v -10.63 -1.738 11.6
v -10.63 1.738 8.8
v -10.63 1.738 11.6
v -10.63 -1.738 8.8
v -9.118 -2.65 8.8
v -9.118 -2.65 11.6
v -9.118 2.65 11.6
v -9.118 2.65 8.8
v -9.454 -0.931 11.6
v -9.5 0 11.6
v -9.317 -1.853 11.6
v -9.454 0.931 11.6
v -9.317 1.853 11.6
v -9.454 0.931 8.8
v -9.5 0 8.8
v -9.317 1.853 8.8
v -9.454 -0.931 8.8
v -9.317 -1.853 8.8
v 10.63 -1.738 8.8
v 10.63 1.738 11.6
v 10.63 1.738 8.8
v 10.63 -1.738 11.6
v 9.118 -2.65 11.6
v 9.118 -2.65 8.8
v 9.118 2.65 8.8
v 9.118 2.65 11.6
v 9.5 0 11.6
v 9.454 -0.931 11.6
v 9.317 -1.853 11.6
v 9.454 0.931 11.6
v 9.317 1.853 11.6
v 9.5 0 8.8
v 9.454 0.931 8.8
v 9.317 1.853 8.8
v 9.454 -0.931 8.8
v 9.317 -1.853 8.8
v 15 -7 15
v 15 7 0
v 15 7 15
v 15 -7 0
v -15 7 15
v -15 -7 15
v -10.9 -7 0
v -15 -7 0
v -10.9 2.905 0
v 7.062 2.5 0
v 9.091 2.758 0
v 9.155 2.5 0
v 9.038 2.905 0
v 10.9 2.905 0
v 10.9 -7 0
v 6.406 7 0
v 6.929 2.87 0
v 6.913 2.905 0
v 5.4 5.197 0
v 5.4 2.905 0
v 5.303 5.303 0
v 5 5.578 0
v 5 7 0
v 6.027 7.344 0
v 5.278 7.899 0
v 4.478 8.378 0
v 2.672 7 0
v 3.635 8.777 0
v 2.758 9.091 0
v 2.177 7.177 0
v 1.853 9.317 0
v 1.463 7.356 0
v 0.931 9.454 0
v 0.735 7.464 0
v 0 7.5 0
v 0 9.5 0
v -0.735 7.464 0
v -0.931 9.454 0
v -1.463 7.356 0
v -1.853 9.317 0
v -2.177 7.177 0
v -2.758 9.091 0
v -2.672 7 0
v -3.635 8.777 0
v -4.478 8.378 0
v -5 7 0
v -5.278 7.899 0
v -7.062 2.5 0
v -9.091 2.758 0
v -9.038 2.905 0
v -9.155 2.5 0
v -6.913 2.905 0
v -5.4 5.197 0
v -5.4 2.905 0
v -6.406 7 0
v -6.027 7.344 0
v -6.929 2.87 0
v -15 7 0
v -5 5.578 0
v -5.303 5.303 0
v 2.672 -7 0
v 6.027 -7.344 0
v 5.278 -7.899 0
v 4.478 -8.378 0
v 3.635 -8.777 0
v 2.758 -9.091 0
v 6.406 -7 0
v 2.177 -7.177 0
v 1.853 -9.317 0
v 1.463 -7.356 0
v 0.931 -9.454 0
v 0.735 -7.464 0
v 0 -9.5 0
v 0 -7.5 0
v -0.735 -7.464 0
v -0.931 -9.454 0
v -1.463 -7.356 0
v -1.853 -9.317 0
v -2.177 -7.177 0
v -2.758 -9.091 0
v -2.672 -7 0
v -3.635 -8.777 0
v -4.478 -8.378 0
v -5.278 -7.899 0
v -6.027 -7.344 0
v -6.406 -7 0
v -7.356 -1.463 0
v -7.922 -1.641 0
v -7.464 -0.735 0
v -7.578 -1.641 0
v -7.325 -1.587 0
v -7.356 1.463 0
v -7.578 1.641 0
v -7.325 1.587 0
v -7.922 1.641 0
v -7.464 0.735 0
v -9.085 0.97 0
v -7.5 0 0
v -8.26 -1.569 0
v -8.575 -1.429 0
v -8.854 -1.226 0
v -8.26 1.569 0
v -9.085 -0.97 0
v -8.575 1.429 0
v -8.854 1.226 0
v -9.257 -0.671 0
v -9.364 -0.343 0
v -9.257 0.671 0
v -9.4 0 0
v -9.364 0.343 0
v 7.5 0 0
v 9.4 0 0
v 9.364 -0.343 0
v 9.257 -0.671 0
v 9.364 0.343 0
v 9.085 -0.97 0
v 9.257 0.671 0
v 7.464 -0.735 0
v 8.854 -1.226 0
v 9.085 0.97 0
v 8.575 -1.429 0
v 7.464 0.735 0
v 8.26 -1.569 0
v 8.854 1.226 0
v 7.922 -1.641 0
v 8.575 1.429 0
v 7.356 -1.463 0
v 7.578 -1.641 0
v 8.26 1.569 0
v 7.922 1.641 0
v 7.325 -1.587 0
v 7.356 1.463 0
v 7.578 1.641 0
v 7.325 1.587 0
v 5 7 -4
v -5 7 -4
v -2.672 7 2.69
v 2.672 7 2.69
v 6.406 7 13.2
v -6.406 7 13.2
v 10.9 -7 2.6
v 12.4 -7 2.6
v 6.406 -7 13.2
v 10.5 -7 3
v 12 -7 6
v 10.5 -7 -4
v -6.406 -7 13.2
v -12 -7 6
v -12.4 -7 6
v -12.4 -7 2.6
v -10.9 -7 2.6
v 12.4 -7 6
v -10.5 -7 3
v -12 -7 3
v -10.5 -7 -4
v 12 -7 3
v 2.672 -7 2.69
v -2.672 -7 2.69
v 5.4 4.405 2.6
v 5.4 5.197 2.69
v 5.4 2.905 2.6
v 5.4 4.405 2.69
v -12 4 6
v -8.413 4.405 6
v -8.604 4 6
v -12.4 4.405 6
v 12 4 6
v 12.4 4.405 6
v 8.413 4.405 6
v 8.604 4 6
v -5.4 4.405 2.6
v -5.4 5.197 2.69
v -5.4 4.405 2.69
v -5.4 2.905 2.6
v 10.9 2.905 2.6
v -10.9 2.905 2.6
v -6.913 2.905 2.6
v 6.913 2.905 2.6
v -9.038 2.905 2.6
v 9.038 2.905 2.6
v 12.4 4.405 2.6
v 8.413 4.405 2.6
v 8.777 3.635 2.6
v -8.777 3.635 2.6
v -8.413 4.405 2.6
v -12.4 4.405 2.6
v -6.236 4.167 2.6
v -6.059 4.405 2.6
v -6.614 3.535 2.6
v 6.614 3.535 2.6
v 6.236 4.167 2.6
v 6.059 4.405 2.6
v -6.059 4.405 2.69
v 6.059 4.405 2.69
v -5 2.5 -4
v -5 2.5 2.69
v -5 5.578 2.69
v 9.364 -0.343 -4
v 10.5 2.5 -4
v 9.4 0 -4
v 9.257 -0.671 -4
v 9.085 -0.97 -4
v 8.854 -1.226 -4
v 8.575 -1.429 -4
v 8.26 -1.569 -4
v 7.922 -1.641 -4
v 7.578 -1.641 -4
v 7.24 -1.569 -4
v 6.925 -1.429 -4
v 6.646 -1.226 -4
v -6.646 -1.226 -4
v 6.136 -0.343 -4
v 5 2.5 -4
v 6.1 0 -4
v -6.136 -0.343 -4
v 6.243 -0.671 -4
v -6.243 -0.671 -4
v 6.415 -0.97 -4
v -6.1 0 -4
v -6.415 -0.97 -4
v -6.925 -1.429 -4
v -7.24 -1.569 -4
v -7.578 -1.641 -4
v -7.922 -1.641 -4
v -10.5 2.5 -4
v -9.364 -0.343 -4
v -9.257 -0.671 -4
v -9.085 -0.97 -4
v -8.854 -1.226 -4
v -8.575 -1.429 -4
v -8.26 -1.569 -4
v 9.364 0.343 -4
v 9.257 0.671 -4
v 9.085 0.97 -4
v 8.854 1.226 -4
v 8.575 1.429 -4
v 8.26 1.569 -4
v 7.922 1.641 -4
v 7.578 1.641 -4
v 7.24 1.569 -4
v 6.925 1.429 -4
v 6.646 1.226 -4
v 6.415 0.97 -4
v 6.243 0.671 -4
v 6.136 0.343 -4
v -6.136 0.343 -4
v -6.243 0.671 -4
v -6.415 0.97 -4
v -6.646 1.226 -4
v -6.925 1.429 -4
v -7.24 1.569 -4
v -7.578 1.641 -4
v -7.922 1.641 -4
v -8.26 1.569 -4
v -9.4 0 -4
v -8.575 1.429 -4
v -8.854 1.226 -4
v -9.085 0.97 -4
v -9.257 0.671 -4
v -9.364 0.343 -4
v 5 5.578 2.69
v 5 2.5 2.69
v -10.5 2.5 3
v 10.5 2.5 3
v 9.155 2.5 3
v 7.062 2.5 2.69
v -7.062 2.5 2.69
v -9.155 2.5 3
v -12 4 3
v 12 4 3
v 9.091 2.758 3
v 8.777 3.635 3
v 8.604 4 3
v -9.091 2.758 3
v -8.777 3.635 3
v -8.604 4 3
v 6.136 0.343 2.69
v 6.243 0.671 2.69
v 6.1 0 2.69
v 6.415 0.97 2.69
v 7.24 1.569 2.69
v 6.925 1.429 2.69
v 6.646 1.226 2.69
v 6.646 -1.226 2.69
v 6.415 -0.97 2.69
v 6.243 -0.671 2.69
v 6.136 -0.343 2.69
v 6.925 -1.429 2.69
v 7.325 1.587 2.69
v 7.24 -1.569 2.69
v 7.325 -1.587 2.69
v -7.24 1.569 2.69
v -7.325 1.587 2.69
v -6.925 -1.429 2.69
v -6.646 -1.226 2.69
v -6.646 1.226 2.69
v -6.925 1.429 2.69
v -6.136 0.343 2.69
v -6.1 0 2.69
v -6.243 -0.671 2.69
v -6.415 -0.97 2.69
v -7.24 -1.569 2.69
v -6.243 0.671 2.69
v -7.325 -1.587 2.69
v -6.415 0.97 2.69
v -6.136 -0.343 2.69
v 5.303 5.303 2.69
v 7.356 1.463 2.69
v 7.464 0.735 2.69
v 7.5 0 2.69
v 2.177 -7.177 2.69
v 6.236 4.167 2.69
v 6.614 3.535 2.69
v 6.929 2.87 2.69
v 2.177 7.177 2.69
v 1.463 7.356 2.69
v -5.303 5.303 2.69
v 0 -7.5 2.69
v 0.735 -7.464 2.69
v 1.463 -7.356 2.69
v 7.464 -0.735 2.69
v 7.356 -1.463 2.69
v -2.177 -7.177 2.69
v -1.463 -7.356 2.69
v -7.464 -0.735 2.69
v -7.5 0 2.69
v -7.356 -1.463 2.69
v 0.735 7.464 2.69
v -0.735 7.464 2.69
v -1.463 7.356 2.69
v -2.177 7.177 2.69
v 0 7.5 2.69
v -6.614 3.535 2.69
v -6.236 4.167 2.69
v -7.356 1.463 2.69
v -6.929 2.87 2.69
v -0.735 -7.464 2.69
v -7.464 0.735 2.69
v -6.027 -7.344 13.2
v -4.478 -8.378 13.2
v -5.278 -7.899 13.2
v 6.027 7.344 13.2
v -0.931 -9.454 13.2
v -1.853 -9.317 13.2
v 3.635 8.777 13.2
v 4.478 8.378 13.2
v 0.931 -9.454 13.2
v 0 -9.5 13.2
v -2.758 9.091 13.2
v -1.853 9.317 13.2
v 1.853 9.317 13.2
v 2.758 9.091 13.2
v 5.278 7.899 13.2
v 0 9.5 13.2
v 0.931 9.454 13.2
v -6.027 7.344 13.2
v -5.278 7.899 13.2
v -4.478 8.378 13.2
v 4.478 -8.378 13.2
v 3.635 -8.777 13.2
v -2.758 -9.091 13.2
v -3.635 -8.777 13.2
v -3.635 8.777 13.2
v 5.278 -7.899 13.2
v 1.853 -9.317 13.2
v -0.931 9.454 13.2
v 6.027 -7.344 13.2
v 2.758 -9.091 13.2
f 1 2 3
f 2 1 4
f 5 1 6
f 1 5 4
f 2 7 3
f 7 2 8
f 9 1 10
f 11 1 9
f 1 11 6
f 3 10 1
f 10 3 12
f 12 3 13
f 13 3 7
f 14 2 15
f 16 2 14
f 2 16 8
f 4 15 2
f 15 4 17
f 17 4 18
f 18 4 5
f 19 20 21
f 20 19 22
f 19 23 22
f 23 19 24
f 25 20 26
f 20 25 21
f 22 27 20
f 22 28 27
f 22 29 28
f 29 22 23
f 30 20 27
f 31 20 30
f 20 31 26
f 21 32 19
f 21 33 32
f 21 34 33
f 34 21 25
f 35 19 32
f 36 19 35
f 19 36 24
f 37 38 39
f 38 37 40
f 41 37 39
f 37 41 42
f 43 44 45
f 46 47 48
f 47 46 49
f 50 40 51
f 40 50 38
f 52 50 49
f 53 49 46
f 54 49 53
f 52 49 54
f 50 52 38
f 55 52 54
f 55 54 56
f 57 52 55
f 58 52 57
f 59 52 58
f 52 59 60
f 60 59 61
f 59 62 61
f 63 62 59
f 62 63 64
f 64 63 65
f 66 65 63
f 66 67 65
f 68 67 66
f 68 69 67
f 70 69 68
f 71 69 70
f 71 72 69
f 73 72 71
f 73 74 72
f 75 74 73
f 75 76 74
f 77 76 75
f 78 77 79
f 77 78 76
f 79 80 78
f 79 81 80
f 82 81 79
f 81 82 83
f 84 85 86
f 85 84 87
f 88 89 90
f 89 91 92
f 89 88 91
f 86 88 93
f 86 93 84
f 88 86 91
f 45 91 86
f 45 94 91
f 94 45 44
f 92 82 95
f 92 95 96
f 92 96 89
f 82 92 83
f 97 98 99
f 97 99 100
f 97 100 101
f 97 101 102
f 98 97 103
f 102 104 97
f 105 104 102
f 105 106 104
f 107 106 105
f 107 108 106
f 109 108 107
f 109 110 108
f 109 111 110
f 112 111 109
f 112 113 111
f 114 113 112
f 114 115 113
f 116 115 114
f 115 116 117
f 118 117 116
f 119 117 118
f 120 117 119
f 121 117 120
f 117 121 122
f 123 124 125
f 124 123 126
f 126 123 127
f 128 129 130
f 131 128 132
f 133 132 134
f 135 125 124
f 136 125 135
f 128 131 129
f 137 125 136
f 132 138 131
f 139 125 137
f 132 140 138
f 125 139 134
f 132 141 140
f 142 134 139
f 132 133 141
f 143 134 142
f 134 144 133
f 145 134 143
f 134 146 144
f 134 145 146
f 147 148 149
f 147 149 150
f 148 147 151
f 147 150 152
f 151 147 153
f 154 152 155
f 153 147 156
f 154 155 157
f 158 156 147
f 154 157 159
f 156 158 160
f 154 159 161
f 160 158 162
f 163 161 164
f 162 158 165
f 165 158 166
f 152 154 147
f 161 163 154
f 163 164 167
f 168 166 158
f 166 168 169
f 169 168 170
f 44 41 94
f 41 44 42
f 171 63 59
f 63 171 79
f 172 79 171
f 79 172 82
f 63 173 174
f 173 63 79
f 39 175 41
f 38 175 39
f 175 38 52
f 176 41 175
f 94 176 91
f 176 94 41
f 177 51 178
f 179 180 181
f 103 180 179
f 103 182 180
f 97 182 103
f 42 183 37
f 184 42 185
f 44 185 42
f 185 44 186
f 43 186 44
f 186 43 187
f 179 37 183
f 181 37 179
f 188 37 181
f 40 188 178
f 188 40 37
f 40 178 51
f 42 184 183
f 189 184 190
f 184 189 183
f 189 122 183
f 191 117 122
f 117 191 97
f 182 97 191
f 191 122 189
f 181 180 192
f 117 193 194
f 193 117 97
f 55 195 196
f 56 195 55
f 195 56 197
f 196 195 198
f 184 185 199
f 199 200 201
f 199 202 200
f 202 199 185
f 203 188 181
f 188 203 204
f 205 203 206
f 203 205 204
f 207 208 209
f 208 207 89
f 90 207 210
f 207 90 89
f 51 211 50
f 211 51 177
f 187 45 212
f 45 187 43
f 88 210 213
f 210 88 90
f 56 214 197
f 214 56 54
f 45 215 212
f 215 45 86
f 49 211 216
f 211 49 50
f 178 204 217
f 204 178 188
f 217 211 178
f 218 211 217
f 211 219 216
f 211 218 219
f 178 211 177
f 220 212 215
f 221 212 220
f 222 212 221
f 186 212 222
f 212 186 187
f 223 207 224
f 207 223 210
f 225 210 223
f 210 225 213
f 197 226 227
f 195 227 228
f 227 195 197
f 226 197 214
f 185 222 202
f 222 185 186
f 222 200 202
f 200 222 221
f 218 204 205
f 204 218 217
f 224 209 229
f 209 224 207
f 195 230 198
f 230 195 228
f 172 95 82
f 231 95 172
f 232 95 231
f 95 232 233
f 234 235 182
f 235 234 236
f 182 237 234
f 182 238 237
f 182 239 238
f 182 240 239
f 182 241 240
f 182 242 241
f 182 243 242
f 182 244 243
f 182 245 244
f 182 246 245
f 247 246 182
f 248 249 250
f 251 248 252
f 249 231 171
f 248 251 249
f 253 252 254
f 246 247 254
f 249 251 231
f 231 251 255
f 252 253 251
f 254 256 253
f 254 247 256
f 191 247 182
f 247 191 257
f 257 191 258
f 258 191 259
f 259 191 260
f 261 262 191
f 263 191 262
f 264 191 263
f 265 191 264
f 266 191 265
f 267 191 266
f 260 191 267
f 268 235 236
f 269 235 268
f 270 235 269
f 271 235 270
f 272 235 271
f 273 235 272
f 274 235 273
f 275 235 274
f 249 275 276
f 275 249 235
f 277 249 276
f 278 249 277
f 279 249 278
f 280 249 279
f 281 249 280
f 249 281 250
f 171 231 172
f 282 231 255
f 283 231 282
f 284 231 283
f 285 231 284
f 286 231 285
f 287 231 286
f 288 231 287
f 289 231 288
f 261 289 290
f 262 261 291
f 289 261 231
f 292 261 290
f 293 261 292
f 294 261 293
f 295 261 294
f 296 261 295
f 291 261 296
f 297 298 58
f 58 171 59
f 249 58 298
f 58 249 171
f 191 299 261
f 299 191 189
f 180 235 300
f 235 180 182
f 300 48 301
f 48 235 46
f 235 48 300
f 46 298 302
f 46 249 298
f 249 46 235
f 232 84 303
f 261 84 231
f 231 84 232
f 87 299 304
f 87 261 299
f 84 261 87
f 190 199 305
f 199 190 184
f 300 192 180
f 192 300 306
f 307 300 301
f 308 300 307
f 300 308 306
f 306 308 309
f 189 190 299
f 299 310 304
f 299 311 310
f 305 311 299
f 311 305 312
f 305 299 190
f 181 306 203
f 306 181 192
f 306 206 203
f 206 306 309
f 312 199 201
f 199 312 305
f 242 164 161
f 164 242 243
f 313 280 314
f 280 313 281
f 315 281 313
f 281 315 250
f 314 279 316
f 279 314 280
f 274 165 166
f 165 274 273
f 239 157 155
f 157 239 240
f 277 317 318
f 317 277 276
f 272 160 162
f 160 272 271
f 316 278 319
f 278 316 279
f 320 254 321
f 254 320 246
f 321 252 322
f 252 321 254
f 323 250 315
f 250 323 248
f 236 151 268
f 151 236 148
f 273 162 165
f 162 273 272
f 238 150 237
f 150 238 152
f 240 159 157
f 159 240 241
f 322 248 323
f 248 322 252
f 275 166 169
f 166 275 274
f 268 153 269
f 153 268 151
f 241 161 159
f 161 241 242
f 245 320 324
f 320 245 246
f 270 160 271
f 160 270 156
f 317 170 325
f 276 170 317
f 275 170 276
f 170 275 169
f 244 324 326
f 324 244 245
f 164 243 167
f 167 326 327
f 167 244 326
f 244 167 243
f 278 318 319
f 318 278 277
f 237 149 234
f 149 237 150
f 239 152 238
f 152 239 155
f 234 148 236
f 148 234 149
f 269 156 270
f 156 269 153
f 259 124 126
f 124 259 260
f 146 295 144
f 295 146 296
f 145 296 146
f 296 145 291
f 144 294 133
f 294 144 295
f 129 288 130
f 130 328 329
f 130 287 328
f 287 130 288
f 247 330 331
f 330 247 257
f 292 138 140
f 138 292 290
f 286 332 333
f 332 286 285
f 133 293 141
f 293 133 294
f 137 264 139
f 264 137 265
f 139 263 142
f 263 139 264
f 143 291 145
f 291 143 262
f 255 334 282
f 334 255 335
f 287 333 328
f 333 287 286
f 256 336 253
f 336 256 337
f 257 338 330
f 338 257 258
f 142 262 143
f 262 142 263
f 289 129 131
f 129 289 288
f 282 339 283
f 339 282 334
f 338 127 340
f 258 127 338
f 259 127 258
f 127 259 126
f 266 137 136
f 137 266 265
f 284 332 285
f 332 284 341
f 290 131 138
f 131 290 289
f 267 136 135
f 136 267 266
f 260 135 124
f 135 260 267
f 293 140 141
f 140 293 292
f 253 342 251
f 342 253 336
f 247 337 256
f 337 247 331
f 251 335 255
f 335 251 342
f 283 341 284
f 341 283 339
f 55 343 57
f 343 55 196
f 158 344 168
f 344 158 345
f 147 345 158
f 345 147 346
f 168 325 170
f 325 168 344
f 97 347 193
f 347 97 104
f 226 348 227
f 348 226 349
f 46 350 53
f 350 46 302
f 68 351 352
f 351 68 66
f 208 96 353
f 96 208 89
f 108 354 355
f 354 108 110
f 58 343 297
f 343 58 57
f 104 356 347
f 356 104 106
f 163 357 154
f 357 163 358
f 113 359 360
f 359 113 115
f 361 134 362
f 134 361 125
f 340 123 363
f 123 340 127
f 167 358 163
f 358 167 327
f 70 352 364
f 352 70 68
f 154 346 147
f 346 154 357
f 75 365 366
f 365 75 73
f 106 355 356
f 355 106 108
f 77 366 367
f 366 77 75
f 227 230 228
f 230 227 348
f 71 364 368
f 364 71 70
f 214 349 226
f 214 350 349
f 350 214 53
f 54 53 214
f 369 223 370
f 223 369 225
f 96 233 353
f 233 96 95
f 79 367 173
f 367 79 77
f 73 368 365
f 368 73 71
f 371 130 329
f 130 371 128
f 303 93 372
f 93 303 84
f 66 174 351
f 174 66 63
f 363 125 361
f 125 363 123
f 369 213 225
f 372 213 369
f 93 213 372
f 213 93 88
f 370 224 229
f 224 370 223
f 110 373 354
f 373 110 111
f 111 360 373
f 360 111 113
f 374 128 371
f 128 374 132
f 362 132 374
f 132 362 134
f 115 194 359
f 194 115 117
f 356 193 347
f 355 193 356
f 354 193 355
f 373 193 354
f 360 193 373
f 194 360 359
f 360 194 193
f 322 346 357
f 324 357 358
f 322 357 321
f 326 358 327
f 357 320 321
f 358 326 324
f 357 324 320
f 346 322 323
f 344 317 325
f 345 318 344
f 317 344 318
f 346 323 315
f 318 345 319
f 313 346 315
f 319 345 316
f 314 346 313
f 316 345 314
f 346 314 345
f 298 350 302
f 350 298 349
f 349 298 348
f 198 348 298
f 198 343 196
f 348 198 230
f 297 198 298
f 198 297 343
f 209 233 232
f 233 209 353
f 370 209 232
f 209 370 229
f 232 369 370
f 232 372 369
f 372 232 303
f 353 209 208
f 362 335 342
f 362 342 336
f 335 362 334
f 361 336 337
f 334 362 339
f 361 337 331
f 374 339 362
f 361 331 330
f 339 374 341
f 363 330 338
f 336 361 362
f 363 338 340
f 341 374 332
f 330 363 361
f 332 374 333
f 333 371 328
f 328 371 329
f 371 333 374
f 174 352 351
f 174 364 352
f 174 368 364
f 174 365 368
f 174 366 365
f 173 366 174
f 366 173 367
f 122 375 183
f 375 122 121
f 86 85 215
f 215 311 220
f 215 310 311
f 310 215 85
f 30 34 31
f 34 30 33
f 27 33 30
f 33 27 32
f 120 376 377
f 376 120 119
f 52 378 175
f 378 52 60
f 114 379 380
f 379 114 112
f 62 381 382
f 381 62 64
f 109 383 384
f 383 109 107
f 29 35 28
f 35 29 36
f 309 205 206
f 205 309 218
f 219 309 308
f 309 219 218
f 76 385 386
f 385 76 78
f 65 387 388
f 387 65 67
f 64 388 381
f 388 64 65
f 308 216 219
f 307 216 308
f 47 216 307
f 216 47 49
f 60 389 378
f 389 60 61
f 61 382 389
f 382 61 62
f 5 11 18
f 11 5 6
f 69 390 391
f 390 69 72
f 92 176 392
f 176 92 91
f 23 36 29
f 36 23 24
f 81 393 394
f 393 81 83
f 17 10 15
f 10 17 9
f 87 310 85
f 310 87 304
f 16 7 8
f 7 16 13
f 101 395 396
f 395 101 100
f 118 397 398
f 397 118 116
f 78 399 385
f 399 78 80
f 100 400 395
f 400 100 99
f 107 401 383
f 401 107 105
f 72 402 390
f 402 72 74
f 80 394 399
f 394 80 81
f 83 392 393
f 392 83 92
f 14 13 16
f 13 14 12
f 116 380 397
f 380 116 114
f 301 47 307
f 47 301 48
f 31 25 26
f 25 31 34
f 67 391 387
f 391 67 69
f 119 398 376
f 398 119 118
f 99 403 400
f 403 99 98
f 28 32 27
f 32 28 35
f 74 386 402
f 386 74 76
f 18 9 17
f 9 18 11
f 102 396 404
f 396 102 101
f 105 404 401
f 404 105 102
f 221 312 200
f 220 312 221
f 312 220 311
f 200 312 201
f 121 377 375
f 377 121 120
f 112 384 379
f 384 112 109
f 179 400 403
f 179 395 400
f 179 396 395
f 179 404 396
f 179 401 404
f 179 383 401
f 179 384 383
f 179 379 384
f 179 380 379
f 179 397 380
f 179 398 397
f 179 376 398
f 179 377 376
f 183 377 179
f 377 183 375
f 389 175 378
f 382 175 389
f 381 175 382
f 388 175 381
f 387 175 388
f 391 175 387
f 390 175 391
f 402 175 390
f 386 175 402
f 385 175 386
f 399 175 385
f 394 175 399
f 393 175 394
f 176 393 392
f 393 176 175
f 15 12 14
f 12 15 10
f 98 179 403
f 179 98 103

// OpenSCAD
include <BOSL2/std.scad>
$fn = 64;

nothing = 0.01;
magnet_od = 15;
magnet_h = 2.7;
screw_hole_od = 3.5;
screw_hole_h = 8.5;

module magnet_mask() {
  cylinder(d = magnet_od, h = magnet_h);
  up(magnet_h - nothing) cylinder(d = screw_hole_od, h = screw_hole_h);
}

// for test prints
module single_magnet_holder() {
  od = magnet_od + 4;
  h = magnet_h + screw_hole_h + 2;
  difference() {
    cylinder(d = od, h = h);
    down(nothing) magnet_mask();
  }
}

single_magnet_holder();
// magnet_mask();
